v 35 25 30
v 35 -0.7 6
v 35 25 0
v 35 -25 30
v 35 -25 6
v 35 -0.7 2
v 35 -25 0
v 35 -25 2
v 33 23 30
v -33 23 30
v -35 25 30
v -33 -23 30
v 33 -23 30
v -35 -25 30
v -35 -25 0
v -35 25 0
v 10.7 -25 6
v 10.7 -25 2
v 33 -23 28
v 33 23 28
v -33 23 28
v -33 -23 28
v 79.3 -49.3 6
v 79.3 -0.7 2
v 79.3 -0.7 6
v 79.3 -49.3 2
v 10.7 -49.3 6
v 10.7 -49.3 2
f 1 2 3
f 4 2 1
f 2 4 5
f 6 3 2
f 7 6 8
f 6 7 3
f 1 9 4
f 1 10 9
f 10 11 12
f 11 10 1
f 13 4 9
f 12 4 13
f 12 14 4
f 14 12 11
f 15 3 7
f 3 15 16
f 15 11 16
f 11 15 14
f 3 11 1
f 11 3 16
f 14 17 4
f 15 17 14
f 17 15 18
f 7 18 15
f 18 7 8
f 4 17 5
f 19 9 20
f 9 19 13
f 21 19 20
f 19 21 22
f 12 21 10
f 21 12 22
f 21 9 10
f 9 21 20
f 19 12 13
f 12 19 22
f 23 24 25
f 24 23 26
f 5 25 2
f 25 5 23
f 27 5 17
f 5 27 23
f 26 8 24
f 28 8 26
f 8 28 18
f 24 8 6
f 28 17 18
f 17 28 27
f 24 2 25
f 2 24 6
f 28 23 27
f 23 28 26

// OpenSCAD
// Two-part enclosure for small electronics board (e.g. Arduino temp logger)
// Print orientation: box on the bed, lid printed upside down next to it

// ---------------- Parameters ----------------
box_x      = 70;    // box outer size in X
box_y      = 50;    // box outer size in Y
box_z      = 30;    // box outer size in Z
box_wall   = 2;     // box wall thickness
box_floor  = 2;     // box floor thickness

lip_t      = 1.5;   // lid lip wall thickness
lip_h      = 4;     // lid lip height
lip_x      = 65.6;  // lid lip outer size in X
lip_y      = 45.6;  // lid lip outer size in Y
lip_plate  = 70;    // lid plate size in X (matches box)
plate_t    = 2;     // lid plate thickness

gap        = 10;    // gap between the two parts
eps        = 0.5;   // cutter overshoot

$fn = 64;

// ---------------- Derived ----------------
box_inner_x = box_x - 2*box_wall;
box_inner_y = box_y - 2*box_wall;
lip_x2      = lip_x + 2*lip_t;   // full lip width (centre to centre of walls)
lip_y2      = lip_y + 2*lip_t;   // full lip depth

// ---------------- Model ----------------
union() {
    // Part 1: open-top box
    difference() {
        translate([-box_x/2, -box_y/2, 0])
            cube([box_x, box_y, box_z]);
        // hollow the box (lip is thick enough that this does not cut it)
        translate([-box_inner_x/2, -box_inner_y/2, box_z - box_wall])
            cube([box_inner_x, box_inner_y, box_wall + eps]);
    }

    // Part 2: lid, printed upside down
    translate([box_x/2 + gap, -box_y/2, 0]) {
        union() {
            // base plate
            translate([-lip_plate/2, -plate_t/2, 0])
                cube([lip_plate, plate_t, 0]);

            // rectangular lip on top of the plate
            translate([-lip_x2/2, -lip_y2/2, plate_t])
                cube([lip_x2, lip_y2, lip_h]);
        }
    }
}
